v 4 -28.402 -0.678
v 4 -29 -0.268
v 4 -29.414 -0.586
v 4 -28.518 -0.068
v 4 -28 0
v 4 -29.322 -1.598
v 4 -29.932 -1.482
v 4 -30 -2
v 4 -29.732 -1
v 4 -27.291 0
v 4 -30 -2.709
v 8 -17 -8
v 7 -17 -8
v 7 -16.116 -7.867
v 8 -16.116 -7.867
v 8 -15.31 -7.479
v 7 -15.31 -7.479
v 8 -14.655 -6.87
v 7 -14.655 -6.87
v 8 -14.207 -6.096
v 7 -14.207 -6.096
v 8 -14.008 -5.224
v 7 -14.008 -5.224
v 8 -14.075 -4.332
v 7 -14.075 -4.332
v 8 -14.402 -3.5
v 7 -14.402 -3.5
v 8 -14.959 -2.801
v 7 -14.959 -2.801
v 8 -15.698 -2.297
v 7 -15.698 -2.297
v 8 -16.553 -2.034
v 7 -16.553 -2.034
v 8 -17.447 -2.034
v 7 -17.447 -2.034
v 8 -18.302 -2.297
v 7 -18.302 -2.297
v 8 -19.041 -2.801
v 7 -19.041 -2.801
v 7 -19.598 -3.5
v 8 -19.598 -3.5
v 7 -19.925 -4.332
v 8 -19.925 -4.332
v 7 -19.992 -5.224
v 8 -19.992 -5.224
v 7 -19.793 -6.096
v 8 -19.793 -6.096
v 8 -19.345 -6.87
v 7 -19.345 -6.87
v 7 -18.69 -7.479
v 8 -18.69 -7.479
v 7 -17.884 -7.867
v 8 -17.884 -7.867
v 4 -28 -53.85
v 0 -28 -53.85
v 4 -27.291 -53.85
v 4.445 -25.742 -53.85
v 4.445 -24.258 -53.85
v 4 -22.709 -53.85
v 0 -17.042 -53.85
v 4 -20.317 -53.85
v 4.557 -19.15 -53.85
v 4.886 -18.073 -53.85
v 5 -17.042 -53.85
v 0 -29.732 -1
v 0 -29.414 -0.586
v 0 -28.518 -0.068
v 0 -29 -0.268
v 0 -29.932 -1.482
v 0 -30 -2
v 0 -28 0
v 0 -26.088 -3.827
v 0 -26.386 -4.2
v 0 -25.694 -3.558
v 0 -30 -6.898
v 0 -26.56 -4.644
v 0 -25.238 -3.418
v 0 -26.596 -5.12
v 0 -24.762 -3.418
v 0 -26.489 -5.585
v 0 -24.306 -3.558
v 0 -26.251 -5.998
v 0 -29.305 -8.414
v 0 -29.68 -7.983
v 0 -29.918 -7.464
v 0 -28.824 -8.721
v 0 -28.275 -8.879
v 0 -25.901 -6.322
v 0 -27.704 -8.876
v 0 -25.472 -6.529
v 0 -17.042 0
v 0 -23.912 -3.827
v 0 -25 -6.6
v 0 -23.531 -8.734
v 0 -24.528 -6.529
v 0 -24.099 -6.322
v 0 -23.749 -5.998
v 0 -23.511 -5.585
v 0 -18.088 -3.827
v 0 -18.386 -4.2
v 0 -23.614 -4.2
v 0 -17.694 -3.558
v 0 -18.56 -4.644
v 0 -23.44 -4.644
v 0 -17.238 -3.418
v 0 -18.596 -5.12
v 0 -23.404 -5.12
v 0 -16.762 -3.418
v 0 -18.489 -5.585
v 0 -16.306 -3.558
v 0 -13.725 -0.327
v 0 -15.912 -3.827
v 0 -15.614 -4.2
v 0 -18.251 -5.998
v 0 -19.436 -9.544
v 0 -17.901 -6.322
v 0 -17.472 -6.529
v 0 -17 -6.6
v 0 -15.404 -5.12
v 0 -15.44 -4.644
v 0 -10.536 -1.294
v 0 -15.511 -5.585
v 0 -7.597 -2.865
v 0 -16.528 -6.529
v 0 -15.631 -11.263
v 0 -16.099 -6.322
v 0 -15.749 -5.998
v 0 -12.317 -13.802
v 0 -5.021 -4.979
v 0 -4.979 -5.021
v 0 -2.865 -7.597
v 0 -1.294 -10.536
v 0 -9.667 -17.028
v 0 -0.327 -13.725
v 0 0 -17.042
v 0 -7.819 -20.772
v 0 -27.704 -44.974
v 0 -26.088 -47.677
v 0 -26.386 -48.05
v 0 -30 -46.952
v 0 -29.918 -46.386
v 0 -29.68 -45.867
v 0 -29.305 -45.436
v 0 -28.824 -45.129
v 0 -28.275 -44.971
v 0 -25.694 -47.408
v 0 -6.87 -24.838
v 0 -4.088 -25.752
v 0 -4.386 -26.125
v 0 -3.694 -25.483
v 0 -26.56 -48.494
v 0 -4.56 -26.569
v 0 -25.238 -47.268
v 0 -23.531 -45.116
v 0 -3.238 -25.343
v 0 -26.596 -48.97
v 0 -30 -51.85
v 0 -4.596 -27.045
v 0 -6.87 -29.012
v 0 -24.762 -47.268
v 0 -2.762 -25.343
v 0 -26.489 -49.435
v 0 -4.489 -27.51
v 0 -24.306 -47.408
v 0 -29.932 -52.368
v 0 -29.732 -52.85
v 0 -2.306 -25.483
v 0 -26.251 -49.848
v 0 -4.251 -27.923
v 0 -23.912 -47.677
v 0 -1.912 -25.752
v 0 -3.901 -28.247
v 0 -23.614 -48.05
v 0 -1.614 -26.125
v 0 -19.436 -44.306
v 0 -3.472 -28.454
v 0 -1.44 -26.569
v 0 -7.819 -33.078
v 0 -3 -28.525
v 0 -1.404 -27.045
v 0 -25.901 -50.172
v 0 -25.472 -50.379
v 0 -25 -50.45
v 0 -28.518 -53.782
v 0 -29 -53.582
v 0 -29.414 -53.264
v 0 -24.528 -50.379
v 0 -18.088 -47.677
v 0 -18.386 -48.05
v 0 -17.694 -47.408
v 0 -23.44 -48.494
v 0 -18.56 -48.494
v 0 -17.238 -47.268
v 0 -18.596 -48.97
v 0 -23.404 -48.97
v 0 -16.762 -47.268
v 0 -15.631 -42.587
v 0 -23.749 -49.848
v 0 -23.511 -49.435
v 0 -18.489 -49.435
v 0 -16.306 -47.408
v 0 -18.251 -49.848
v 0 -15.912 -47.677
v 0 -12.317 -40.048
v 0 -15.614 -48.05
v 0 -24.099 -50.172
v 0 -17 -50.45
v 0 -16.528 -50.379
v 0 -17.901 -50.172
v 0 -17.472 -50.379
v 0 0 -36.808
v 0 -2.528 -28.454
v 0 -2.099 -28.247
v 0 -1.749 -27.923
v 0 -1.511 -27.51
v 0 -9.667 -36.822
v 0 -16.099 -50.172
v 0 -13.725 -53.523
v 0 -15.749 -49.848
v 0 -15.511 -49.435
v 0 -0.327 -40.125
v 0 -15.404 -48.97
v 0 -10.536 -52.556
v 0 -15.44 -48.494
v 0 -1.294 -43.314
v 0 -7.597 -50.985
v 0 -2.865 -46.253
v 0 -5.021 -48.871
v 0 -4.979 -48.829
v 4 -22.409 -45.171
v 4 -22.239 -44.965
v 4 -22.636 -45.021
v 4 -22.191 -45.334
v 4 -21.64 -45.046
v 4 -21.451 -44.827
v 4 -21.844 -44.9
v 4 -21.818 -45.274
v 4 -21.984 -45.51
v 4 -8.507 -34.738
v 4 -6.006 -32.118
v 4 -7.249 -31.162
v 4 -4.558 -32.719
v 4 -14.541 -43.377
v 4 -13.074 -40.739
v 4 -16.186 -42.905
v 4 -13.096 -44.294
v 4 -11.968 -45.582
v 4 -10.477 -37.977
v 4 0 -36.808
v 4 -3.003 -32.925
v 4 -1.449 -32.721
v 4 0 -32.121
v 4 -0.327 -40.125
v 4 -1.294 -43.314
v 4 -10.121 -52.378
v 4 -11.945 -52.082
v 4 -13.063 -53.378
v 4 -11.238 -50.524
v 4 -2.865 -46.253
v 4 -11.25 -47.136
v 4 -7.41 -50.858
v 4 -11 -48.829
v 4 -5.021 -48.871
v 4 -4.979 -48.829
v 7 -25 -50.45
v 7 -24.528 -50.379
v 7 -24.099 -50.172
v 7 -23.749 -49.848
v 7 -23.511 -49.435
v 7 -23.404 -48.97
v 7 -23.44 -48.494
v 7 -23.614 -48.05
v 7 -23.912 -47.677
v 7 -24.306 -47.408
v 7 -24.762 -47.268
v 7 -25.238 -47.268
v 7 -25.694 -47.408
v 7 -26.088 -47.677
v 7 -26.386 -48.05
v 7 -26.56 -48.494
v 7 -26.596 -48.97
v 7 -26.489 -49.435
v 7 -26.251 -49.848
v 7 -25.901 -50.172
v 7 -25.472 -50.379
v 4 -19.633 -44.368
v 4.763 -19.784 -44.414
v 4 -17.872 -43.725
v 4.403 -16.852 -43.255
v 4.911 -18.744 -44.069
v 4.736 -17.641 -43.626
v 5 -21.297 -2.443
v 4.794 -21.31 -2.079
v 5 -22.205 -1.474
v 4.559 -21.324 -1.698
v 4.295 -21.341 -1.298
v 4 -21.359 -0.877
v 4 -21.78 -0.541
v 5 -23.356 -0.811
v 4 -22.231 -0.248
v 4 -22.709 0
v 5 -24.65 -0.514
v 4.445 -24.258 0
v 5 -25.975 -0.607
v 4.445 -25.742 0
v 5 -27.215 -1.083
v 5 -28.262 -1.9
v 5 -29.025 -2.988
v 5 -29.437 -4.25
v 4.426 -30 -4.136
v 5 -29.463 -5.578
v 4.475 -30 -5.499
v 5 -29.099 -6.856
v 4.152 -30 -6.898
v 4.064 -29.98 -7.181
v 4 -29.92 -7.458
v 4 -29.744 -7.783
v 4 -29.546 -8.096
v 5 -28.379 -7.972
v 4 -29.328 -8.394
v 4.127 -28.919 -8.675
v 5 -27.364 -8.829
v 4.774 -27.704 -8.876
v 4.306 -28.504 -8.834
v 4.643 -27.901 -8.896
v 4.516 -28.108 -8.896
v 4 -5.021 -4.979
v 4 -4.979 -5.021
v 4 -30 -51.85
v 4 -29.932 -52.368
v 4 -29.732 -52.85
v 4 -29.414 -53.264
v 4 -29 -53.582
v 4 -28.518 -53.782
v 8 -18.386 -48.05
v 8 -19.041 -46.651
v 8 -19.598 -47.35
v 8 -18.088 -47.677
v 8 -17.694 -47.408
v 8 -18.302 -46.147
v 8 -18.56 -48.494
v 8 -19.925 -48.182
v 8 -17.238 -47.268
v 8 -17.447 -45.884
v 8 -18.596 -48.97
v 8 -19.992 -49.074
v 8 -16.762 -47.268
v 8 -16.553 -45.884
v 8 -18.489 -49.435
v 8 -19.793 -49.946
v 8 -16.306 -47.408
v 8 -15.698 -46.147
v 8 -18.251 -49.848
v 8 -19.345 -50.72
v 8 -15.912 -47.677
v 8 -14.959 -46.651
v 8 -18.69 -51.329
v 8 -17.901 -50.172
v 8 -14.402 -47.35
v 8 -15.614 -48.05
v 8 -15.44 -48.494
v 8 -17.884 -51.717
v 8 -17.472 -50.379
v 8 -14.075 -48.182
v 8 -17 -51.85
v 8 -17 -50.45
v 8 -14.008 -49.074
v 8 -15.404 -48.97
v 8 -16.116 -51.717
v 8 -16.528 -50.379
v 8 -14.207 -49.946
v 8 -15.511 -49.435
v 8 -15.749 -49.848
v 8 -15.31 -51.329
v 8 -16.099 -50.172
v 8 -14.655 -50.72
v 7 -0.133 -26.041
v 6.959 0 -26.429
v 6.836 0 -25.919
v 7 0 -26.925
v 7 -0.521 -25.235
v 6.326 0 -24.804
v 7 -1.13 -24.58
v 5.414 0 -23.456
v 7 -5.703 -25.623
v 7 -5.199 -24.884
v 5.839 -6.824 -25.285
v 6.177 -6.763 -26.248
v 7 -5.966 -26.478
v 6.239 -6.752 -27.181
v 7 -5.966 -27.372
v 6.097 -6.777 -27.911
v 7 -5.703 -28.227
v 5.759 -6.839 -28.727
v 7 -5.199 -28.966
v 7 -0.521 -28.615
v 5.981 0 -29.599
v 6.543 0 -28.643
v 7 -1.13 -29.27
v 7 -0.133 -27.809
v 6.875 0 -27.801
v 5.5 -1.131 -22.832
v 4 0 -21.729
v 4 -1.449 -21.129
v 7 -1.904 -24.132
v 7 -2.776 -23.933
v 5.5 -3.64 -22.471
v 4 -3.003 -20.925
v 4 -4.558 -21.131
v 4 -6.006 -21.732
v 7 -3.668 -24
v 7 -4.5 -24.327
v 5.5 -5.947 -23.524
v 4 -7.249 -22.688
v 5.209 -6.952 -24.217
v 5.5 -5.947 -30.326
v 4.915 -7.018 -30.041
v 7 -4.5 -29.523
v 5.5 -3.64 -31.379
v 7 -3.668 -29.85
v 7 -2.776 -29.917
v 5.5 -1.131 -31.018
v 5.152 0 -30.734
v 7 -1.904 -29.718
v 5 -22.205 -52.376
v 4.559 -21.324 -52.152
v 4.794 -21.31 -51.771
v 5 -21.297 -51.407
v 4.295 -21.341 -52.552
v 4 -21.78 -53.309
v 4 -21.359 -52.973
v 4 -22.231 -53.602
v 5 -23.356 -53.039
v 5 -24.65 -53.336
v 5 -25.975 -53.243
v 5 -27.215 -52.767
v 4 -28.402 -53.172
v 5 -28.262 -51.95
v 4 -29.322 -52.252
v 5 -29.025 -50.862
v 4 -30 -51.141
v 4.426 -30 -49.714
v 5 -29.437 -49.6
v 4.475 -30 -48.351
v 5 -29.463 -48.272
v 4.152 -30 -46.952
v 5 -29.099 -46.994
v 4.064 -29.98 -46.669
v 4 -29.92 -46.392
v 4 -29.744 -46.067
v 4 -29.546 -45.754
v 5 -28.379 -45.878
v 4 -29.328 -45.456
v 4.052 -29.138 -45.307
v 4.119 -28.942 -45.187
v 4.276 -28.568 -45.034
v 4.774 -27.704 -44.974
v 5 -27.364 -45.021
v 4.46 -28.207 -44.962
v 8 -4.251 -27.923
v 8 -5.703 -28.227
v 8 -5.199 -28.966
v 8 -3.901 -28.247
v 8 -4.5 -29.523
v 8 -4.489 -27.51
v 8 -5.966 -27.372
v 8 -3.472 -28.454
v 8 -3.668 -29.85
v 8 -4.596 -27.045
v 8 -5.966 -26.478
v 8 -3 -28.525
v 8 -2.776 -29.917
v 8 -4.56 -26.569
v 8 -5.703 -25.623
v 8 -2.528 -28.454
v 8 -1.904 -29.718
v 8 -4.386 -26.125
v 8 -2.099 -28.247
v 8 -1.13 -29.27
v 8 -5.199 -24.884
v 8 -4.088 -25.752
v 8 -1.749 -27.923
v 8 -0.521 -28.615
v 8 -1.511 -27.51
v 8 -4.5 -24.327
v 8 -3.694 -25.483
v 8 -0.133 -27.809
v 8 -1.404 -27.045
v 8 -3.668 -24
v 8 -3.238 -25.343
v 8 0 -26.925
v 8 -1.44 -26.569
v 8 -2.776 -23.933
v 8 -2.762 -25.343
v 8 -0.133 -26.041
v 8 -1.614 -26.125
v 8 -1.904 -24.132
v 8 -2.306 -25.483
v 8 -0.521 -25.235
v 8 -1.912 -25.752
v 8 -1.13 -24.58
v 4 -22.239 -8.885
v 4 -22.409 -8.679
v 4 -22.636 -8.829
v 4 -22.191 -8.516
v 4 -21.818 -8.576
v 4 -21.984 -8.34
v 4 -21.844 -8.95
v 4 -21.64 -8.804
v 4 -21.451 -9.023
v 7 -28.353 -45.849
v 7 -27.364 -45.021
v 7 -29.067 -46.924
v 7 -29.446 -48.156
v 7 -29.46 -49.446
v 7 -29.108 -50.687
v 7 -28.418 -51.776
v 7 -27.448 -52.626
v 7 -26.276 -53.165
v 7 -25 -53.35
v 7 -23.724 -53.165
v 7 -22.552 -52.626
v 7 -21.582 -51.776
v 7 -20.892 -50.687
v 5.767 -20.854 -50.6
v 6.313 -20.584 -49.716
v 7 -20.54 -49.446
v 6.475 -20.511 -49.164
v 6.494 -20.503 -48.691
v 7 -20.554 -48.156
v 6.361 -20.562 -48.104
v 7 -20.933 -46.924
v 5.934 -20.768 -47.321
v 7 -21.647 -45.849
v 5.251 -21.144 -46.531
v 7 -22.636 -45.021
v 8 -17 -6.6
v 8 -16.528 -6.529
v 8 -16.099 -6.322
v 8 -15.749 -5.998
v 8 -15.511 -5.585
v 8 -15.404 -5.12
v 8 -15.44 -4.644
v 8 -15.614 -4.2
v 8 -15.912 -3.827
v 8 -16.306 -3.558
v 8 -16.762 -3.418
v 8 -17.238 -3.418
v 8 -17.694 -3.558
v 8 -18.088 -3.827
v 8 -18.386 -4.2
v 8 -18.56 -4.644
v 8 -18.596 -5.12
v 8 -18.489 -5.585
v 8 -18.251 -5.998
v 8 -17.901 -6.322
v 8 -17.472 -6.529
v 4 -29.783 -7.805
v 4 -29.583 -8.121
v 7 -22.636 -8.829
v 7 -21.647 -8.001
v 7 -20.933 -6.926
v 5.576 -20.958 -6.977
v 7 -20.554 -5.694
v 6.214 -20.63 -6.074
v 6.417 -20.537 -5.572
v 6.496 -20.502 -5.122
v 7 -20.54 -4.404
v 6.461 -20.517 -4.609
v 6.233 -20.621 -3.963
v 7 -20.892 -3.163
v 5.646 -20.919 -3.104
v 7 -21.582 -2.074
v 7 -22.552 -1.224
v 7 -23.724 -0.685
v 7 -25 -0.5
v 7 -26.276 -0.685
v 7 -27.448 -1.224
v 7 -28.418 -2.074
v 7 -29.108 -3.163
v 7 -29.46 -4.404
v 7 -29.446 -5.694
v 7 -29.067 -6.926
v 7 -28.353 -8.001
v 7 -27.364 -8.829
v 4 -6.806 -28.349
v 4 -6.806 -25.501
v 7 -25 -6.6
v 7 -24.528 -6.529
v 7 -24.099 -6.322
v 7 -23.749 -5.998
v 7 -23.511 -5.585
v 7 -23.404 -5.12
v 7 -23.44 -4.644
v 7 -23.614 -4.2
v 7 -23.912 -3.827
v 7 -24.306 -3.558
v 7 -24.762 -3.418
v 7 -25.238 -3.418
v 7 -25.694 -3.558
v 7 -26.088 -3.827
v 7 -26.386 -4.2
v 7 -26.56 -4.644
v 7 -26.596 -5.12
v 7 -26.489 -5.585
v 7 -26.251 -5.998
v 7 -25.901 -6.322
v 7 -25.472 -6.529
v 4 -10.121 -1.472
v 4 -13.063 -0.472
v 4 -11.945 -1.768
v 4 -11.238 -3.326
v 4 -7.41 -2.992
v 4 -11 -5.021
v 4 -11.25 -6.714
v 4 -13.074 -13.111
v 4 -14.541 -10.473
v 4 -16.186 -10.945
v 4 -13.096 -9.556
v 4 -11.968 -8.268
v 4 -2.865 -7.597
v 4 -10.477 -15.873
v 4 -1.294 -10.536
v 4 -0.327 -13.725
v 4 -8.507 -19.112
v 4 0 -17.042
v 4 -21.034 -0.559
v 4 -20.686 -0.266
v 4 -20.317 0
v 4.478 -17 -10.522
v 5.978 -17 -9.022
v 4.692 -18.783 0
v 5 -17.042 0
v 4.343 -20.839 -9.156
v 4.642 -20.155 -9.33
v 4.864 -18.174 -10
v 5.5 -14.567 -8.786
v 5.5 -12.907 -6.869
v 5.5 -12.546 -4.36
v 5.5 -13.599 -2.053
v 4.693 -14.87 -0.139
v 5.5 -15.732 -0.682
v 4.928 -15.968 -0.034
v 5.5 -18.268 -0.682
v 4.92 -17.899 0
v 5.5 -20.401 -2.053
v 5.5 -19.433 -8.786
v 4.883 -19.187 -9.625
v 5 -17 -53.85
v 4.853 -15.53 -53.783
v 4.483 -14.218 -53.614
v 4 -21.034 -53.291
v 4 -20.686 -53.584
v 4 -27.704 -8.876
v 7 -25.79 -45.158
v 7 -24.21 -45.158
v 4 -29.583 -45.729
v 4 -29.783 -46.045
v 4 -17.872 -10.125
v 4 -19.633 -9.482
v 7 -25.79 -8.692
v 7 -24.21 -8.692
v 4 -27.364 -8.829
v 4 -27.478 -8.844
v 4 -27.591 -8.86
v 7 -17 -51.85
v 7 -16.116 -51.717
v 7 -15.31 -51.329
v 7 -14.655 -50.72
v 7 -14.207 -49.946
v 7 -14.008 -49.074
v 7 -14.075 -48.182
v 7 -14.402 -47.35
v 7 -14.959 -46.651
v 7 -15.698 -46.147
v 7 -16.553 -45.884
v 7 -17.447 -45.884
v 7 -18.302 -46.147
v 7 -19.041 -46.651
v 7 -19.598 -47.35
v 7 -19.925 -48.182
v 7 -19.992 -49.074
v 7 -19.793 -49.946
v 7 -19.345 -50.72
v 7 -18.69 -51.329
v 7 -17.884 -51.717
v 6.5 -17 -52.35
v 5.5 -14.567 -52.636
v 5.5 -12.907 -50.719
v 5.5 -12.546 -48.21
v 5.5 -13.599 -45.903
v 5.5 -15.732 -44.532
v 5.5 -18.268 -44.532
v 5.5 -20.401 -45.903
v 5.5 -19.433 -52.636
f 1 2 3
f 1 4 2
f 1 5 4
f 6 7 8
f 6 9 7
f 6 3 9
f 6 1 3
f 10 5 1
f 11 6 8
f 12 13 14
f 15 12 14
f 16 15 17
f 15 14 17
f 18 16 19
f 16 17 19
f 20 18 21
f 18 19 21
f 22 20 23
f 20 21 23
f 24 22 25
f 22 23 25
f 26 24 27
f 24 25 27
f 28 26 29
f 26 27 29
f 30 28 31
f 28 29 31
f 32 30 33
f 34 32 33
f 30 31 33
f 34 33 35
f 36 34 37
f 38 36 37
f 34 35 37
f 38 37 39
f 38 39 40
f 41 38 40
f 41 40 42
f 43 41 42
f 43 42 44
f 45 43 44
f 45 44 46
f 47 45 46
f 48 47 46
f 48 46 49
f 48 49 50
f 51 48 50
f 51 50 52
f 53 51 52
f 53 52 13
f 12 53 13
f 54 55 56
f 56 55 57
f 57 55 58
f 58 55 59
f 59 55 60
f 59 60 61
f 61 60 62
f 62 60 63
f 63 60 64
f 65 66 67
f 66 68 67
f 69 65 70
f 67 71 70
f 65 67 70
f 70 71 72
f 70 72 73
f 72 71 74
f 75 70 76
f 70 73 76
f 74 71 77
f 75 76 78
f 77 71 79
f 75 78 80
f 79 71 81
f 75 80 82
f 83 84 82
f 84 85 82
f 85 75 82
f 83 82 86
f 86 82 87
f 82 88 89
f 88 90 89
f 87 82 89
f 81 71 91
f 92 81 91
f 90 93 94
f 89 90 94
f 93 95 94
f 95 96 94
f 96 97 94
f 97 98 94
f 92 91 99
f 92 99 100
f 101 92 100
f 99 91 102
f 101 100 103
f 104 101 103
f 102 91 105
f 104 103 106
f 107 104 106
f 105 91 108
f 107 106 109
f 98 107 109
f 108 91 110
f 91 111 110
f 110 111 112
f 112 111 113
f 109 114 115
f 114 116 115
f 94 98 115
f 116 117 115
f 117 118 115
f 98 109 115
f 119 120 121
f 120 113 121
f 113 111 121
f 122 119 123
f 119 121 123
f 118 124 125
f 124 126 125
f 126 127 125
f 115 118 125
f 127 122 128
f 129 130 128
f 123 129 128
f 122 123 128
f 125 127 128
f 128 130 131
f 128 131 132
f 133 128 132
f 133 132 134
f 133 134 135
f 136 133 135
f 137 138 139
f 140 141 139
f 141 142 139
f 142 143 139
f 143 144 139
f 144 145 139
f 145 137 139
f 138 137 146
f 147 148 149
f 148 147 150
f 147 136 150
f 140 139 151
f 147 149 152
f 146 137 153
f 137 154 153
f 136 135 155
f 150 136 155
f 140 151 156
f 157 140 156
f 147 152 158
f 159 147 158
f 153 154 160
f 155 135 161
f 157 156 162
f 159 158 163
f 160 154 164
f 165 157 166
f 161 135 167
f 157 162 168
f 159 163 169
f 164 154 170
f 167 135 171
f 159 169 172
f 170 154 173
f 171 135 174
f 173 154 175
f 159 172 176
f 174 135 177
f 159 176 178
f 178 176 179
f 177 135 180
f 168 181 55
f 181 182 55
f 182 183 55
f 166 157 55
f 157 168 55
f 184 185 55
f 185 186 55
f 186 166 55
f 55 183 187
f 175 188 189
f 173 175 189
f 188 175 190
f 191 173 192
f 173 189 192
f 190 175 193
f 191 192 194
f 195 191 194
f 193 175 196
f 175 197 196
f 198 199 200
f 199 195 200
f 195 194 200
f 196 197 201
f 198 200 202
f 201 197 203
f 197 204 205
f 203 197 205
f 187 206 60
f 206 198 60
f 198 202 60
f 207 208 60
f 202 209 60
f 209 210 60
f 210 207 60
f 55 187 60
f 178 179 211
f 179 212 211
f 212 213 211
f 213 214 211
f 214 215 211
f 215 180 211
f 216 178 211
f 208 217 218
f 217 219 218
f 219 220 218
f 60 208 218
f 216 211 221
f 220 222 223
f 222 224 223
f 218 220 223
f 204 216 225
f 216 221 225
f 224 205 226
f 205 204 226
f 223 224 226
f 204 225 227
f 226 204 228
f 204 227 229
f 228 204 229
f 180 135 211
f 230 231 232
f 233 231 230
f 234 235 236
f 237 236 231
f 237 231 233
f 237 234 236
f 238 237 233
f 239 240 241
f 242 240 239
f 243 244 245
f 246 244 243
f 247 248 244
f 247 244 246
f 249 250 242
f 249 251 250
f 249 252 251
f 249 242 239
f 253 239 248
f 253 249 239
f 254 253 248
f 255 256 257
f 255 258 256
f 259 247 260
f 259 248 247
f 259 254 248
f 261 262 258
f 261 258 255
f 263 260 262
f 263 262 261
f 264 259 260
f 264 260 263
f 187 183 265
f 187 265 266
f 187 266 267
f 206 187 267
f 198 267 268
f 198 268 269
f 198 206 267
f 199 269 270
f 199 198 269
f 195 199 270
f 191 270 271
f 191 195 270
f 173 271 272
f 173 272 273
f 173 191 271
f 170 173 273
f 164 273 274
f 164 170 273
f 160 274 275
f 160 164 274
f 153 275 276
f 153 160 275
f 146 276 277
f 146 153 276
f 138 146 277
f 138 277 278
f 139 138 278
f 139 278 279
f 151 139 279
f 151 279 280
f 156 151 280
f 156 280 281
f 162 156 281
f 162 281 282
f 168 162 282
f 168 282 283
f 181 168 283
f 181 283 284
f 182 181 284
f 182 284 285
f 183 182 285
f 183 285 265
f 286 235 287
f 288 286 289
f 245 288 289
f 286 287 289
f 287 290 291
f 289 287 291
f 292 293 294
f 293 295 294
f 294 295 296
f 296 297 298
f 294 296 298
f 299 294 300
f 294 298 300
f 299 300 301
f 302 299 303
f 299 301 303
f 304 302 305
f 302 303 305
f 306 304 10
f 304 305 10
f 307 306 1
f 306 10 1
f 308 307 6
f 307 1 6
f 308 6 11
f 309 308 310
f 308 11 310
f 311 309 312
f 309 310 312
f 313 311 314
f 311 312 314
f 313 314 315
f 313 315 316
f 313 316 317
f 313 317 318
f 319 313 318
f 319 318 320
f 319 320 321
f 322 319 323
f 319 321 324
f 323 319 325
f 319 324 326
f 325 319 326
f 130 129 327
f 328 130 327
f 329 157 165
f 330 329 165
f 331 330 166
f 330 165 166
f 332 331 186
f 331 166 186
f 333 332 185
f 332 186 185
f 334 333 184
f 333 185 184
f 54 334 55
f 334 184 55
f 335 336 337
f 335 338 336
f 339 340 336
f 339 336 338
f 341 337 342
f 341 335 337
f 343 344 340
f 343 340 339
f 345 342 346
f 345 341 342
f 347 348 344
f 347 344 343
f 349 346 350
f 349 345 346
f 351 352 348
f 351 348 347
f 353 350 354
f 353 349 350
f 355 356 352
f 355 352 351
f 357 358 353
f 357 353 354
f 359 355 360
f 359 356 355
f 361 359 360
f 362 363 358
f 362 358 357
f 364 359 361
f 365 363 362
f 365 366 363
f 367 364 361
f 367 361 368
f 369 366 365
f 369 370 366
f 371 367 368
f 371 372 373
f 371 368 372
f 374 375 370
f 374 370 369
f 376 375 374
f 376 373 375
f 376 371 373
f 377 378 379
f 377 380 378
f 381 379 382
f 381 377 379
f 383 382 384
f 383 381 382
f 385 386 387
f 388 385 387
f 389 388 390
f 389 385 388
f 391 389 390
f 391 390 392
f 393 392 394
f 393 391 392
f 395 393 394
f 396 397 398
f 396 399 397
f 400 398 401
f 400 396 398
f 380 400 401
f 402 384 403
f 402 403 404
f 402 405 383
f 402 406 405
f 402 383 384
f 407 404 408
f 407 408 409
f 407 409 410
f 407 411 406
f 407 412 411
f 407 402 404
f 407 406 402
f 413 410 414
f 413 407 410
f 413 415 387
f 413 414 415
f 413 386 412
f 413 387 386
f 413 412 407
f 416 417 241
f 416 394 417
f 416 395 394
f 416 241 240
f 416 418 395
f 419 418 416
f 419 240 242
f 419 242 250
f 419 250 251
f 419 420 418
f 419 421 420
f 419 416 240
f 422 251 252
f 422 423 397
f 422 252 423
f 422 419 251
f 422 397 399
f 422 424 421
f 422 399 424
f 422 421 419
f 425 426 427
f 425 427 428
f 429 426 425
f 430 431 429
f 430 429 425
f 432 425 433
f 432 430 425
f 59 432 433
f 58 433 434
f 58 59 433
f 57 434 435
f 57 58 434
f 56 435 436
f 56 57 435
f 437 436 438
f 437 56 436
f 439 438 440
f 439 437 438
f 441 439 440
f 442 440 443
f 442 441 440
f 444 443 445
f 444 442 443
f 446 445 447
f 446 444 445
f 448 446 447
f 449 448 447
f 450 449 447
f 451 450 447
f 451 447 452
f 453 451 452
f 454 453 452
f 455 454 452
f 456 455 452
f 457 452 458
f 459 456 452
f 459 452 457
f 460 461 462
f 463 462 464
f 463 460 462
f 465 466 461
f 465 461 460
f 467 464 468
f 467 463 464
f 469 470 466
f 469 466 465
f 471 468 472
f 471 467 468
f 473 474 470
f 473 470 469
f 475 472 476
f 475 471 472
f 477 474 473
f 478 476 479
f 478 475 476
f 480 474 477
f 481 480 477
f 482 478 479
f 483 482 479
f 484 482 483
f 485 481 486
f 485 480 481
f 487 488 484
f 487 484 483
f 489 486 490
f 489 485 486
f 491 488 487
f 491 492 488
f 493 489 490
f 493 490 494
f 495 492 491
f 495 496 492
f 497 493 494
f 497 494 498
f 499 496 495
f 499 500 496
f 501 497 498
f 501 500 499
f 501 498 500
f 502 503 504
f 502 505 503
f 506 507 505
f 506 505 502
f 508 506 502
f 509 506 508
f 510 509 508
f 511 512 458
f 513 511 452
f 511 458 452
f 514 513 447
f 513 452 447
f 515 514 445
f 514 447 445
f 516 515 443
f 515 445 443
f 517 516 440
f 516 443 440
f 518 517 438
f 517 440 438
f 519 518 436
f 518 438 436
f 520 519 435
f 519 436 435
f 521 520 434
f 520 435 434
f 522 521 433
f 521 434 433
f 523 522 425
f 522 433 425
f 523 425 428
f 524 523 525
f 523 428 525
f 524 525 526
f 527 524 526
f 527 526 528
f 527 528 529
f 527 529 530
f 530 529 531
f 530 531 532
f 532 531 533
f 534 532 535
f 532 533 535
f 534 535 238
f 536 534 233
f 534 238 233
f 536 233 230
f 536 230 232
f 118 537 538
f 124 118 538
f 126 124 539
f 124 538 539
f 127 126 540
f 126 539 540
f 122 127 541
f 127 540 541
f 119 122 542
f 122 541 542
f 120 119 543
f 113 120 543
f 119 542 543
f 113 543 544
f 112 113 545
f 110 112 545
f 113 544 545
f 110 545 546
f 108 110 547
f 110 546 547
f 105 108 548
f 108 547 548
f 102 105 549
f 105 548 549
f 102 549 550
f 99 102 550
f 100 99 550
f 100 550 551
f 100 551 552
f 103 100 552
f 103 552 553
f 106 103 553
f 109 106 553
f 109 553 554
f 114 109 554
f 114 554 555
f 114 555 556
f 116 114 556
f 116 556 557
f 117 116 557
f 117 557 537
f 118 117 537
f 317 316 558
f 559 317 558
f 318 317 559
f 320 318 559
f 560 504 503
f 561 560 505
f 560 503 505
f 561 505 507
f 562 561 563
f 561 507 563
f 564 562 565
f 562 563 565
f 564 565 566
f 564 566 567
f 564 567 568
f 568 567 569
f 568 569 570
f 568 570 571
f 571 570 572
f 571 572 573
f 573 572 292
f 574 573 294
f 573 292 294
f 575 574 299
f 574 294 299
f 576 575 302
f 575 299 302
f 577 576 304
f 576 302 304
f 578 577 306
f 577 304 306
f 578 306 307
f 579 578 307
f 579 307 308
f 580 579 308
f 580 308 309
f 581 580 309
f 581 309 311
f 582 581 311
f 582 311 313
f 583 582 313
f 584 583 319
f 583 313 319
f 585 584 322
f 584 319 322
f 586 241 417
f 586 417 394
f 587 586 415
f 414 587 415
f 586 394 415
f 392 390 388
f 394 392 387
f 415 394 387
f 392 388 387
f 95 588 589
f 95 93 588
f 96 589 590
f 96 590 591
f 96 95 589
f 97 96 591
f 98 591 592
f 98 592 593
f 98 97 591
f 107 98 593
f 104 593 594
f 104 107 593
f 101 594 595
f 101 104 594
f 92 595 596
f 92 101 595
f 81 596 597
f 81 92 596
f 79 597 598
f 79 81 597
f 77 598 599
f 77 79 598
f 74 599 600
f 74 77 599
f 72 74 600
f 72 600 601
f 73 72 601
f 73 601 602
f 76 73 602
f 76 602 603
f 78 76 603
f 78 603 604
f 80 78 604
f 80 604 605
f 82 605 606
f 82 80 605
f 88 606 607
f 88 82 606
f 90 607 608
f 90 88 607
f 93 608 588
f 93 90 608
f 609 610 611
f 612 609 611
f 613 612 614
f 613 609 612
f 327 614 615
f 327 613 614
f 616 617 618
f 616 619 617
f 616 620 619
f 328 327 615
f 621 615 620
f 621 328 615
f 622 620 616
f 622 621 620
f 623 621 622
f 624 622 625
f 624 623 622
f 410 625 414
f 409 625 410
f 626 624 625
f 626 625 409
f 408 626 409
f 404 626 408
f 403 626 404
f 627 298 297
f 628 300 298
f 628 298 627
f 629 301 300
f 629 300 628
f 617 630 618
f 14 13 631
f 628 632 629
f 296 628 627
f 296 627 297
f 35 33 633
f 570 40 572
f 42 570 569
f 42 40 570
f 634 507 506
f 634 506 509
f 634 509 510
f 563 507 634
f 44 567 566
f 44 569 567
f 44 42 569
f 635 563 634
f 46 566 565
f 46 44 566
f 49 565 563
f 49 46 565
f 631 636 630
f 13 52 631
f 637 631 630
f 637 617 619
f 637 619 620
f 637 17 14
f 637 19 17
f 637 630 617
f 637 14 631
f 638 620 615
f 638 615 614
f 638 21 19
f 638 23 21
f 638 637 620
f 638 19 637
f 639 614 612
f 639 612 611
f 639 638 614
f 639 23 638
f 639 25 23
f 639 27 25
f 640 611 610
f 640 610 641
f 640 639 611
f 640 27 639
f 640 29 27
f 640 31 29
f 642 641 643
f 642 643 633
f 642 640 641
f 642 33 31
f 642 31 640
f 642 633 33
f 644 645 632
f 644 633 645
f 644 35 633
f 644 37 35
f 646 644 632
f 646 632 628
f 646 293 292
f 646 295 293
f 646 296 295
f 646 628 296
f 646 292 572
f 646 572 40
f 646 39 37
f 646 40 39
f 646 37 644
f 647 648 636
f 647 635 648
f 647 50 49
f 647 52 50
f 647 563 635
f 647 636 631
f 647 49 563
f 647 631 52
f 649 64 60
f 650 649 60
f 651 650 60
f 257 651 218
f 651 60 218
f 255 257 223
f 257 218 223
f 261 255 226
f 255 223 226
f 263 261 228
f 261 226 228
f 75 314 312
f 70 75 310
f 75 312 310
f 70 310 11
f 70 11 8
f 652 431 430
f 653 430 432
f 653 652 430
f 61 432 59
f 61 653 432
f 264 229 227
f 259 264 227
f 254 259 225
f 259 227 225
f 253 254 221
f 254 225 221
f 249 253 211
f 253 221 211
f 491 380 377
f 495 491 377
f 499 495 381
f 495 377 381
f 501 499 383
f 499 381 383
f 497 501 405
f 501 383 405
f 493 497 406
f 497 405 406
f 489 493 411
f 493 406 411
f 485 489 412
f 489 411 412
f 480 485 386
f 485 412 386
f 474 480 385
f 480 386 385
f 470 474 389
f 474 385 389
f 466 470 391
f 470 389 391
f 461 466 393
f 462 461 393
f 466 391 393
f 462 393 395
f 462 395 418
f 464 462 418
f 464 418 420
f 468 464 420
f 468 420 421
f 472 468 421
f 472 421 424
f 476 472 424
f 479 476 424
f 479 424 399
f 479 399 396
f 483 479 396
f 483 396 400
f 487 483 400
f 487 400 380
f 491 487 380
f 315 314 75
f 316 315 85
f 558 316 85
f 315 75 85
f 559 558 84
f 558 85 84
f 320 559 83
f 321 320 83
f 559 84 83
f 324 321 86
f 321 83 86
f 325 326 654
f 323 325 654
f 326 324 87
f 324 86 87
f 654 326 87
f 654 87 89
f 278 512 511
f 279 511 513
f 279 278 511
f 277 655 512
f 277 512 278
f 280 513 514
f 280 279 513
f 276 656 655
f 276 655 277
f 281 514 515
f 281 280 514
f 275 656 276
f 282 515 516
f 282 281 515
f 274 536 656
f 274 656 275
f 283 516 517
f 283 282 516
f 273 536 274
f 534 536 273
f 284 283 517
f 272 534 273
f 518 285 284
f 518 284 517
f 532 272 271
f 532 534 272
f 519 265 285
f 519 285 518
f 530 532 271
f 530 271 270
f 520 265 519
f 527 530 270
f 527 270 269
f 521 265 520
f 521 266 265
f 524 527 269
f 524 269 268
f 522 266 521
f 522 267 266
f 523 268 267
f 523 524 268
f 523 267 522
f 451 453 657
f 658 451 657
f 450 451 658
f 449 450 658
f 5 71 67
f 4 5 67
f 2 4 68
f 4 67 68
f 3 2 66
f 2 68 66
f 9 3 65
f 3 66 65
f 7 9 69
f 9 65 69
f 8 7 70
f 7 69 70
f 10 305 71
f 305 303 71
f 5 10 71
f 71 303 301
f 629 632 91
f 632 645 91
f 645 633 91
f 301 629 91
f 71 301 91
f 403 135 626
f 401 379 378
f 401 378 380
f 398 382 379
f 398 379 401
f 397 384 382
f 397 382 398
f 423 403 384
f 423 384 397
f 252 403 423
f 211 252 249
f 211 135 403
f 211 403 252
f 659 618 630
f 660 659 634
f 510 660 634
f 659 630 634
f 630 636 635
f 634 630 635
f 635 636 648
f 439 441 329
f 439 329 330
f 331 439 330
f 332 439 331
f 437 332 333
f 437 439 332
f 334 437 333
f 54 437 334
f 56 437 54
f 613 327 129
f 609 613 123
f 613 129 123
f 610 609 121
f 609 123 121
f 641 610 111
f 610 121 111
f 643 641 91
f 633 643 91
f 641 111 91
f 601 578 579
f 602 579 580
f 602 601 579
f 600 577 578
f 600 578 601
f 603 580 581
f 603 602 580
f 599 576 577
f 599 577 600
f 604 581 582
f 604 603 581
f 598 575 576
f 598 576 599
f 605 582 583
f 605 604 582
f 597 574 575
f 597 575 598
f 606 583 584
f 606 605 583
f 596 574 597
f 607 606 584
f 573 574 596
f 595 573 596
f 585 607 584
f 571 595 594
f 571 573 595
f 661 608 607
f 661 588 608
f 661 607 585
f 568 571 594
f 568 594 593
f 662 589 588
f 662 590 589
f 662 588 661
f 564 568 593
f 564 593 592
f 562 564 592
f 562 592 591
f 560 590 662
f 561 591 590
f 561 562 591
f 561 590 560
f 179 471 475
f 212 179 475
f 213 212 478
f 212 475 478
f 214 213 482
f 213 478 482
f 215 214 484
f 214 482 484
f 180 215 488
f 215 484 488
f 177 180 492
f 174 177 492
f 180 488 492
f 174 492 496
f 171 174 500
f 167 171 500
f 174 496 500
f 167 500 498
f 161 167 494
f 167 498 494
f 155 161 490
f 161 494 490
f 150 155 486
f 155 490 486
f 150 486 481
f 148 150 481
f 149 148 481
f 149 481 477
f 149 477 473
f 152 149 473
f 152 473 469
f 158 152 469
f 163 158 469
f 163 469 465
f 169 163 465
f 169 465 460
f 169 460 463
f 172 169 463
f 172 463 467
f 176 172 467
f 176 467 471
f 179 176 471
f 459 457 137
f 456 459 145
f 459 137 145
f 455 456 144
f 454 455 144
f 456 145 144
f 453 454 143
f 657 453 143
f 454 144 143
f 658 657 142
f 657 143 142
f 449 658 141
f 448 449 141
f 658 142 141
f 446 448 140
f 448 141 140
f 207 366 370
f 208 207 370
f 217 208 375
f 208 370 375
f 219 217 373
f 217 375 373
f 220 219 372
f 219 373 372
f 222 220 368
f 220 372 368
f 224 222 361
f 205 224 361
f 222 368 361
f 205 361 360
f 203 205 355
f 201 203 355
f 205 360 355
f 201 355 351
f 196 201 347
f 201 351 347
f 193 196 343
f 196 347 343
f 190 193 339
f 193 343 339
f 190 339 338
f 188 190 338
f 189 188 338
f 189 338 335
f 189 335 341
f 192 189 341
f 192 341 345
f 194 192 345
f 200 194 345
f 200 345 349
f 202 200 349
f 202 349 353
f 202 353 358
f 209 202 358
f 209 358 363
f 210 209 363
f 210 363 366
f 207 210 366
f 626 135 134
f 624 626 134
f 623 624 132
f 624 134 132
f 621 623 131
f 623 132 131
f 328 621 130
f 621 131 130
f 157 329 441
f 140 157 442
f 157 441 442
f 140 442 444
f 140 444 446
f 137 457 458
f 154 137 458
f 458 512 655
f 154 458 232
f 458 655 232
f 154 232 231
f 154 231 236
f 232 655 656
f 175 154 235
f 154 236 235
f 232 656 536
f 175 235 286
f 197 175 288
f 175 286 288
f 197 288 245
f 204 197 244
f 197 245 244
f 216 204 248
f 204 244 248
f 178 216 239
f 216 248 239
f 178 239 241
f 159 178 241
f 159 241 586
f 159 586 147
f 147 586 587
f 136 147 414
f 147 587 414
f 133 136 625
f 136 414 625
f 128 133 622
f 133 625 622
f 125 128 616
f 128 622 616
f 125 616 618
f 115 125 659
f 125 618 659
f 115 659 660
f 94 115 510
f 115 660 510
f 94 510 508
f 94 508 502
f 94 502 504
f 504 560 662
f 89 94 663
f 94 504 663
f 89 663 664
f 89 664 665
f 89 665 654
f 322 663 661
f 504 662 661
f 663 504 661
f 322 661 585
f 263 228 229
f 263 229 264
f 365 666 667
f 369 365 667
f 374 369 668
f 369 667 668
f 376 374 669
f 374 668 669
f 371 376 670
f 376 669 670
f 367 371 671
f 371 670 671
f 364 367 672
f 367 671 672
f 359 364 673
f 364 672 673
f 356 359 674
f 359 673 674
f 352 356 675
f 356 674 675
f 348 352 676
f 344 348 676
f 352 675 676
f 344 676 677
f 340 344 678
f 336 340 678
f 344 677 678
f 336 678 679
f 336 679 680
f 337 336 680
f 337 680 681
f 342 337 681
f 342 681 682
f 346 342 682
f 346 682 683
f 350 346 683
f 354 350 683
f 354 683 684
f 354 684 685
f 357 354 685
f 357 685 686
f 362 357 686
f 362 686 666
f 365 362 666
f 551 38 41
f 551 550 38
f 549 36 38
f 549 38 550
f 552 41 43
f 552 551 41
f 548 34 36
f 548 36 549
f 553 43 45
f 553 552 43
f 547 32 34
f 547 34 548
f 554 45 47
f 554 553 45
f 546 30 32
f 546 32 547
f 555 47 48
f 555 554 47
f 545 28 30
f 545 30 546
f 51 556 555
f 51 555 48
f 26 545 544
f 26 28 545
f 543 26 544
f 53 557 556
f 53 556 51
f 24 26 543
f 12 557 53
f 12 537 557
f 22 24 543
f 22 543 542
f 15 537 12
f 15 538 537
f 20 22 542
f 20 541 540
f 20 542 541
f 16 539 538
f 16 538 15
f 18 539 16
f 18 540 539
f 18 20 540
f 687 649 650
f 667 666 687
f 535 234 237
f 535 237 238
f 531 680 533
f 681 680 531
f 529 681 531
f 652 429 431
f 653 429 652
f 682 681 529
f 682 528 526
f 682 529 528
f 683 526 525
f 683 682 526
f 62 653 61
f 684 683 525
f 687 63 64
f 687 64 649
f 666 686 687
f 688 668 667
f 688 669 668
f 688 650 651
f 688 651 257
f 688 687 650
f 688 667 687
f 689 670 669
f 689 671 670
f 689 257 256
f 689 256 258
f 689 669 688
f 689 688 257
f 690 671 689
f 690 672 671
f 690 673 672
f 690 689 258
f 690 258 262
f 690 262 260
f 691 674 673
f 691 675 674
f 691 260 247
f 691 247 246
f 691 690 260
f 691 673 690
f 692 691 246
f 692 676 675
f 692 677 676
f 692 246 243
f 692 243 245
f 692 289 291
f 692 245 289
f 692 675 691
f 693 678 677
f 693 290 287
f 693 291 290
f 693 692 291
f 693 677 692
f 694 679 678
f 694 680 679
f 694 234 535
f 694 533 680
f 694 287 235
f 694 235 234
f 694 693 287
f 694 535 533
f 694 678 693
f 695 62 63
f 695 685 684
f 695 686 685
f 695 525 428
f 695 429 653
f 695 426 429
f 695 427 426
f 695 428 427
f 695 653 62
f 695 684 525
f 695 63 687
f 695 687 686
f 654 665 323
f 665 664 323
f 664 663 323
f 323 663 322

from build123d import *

# Parameters (mm, degrees)
SKETCH_1_W               = 53.85
SKETCH_1_H               = 30
SKETCH_1_R               = 1.6
EXTRUDE_1_DEPTH          = 4
SKETCH_7_R               = 4.5
SKETCH_7_R_2             = 1.6
EXTRUDE_3_DEPTH          = 3
CUT_EXTRUDE_1_DEPTH      = 62.772344136
CUT_EXTRUDE_1_DEPTH_BACK = 4
SKETCH_2_R               = 18.25
CHAMFER_1_SIZE           = 10
SKETCH_3_R               = 3
EXTRUDE_2_DEPTH          = 4
SKETCH_4_R               = 1.6
CUT_EXTRUDE_2_DEPTH      = 63.159653313
CHAMFER_3_SIZE           = 3
CHAMFER_4_SIZE           = 1
FILLET_1_R               = 2
FILLET_2_R               = 17


with BuildPart() as part:
    # 草图1 → 凸台-拉伸1 (new body)
    with BuildSketch(Plane(origin=(0, 0, 0), x_dir=(0, 0, -1), z_dir=(1, 0, 0))):
        with Locations((26.925, -15)):
            Rectangle(SKETCH_1_W, SKETCH_1_H)
        with Locations((5, -25)):
            Circle(SKETCH_1_R, mode=Mode.SUBTRACT)
        with Locations((48.85, -25)):
            Circle(SKETCH_1_R, mode=Mode.SUBTRACT)
    extrude(amount=EXTRUDE_1_DEPTH)

    # 草图7 → 凸台-拉伸3 (add)
    # profile 1 of 2: a face of its own
    with BuildSketch(Plane(origin=(4, 0, 0), x_dir=(0, 0, -1), z_dir=(1, 0, 0))):
        with Locations((5, -25)):
            Circle(SKETCH_7_R)
        with Locations((5, -25)):
            Circle(SKETCH_7_R_2, mode=Mode.SUBTRACT)
    # profile 2 of 2: a face of its own
    with BuildSketch(Plane(origin=(4, 0, 0), x_dir=(0, 0, -1), z_dir=(1, 0, 0))):
        with Locations((48.85, -25)):
            Circle(SKETCH_7_R)
        with Locations((48.85, -25)):
            Circle(SKETCH_7_R_2, mode=Mode.SUBTRACT)
    extrude(amount=EXTRUDE_3_DEPTH)

    # 草图2 → 切除-拉伸1 (cut, two sides: drawn at the far end of the back side and taken through both)
    with BuildSketch(Plane(origin=(4, 0, 0), x_dir=(0, 0, -1), z_dir=(1, 0, 0)).offset(-CUT_EXTRUDE_1_DEPTH_BACK)):
        with Locations((26.925, -25)):
            Circle(SKETCH_2_R)
    extrude(amount=CUT_EXTRUDE_1_DEPTH + CUT_EXTRUDE_1_DEPTH_BACK, mode=Mode.SUBTRACT)

    # 倒角1
    chamfer_1_edges = [part.edges().sort_by_distance(p)[0] for p in [
        (2, 0, 0),
        (2, 0, -53.85),
    ]]
    chamfer(chamfer_1_edges, length=CHAMFER_1_SIZE)

    # 草图3 → 凸台-拉伸2 (add)
    with BuildSketch(Plane(origin=(4, 0, 0), x_dir=(0, 0, -1), z_dir=(1, 0, 0))):
        with Locations((5, -17)):
            Circle(SKETCH_3_R)
        with Locations((48.85, -17)):
            Circle(SKETCH_3_R)
        with Locations(Location((26.925, -3, 0), (0, 0, 90))):
            Circle(SKETCH_3_R)
    extrude(amount=EXTRUDE_2_DEPTH)

    # 草图4 → 切除-拉伸2 (cut, through all)
    with BuildSketch(Plane(origin=(8, 0, 0), x_dir=(0, 0, -1), z_dir=(1, 0, 0))):
        with Locations((5, -17)):
            Circle(SKETCH_4_R)
        with Locations((48.85, -17)):
            Circle(SKETCH_4_R)
        with Locations((26.925, -3)):
            Circle(SKETCH_4_R)
    extrude(amount=-CUT_EXTRUDE_2_DEPTH, mode=Mode.SUBTRACT)

    # 倒角3
    # the kernel refuses this chamfer: 3 mm, written as the material it adds along each edge
    with BuildSketch(Plane(origin=(4, -17, -5), x_dir=(0, 0, -1), z_dir=(0, -1, 0))) as chamfer_3_piece_1_section:
        Polygon((3 + CHAMFER_3_SIZE, 0), (3, CHAMFER_3_SIZE), (3, 0), align=None)
    chamfer_3_piece_1 = revolve(axis=Axis((4, -17, -5), (1, 0, 0)), mode=Mode.PRIVATE)
    chamfer_3_piece_1 = split(chamfer_3_piece_1, bisect_by=Plane(origin=(5.467307701, -17, 0), z_dir=(0, 0, -1)), keep=Keep.TOP, mode=Mode.PRIVATE)
    chamfer_3_piece_1 = chamfer_3_piece_1 - Plane(origin=(5.467307701, -25, -26.925), x_dir=(0, 0, -1), z_dir=(1, 0, 0)) * Cylinder(18.25, 25, mode=Mode.PRIVATE)
    with BuildSketch(Plane(origin=(4, -17, -48.85), x_dir=(0, 0, -1), z_dir=(0, -1, 0))) as chamfer_3_piece_2_section:
        Polygon((3 + CHAMFER_3_SIZE, 0), (3, CHAMFER_3_SIZE), (3, 0), align=None)
    chamfer_3_piece_2 = revolve(axis=Axis((4, -17, -48.85), (1, 0, 0)), mode=Mode.PRIVATE)
    chamfer_3_piece_2 = chamfer_3_piece_2 - Plane(origin=(5.467307729, -25, -26.925), x_dir=(0, 0, -1), z_dir=(1, 0, 0)) * Cylinder(18.25, 24, mode=Mode.PRIVATE)
    chamfer_3_piece_2 = split(chamfer_3_piece_2, bisect_by=Plane(origin=(5.467307729, -17, -53.85), z_dir=(0, 0, 1)), keep=Keep.TOP, mode=Mode.PRIVATE)
    with BuildSketch(Plane(origin=(4, -3, -26.925), x_dir=(0, 1, 0), z_dir=(0, 0, -1))) as chamfer_3_piece_3_section:
        Polygon((3 + CHAMFER_3_SIZE, 0), (3, CHAMFER_3_SIZE), (3, 0), align=None)
    chamfer_3_piece_3 = revolve(axis=Axis((4, -3, -26.925), (1, 0, 0)), mode=Mode.PRIVATE)
    chamfer_3_piece_3 = split(chamfer_3_piece_3, bisect_by=Plane(origin=(4.469931391, 0, -22.187900458), z_dir=(0, -1, 0)), keep=Keep.TOP, mode=Mode.PRIVATE)
    chamfer_3_piece_3 = chamfer_3_piece_3 - Plane(origin=(4.469931391, -25, -26.925), x_dir=(0, 0, -1), z_dir=(1, 0, 0)) * Cylinder(18.25, 24, mode=Mode.PRIVATE)
    add([chamfer_3_piece_1, chamfer_3_piece_2, chamfer_3_piece_3])

    # 倒角4
    # the kernel refuses this chamfer: 1 mm, written as the material it adds along each edge
    with BuildSketch(Plane(origin=(4, -25, -48.85), x_dir=(0, 0.9653833924151701, -0.26083501614809607), z_dir=(0, 0.26083501614809607, 0.9653833924151701))) as chamfer_4_piece_1_section:
        Polygon((4.5, -CHAMFER_4_SIZE), (4.5 + CHAMFER_4_SIZE, 0), (4.5, 0), align=None)
    chamfer_4_piece_1 = revolve(axis=Axis((4, -25, -48.85), (-1, 0, 0)), revolution_arc=255.986755494, mode=Mode.PRIVATE)
    chamfer_4_piece_1 = chamfer_4_piece_1 - Plane(origin=(4.294296116, -25, -26.925), x_dir=(0, 0, -1), z_dir=(1, 0, 0)) * Cylinder(18.25, 22, mode=Mode.PRIVATE)
    chamfer_4_piece_1 = split(chamfer_4_piece_1, bisect_by=Plane(origin=(4.294296116, -30, -51.249638495), z_dir=(0, 1, 0)), keep=Keep.TOP, mode=Mode.PRIVATE)
    chamfer_4_piece_1 = split(chamfer_4_piece_1, bisect_by=Plane(origin=(4.294296116, -20.838072268, -53.85), z_dir=(0, 0, 1)), keep=Keep.TOP, mode=Mode.PRIVATE)
    add(chamfer_4_piece_1)
    with BuildSketch(Plane(origin=(4, -25, -5), x_dir=(0, 0.9653833924151692, 0.26083501614809945), z_dir=(0, 0.26083501614809945, -0.9653833924151692))) as chamfer_4_piece_2_section:
        Polygon((4.5, CHAMFER_4_SIZE), (4.5 + CHAMFER_4_SIZE, 0), (4.5, 0), align=None)
    chamfer_4_piece_2 = revolve(axis=Axis((4, -25, -5), (1, 0, 0)), revolution_arc=255.986755494, mode=Mode.PRIVATE)
    chamfer_4_piece_2 = chamfer_4_piece_2 - Plane(origin=(4.294296117, -25, -26.925), x_dir=(0, 0, -1), z_dir=(1, 0, 0)) * Cylinder(18.25, 22, mode=Mode.PRIVATE)
    chamfer_4_piece_2 = split(chamfer_4_piece_2, bisect_by=Plane(origin=(4.294296117, -30, -2.600361506), z_dir=(0, 1, 0)), keep=Keep.TOP, mode=Mode.PRIVATE)
    chamfer_4_piece_2 = split(chamfer_4_piece_2, bisect_by=Plane(origin=(4.294296117, -20.838072268, 0), z_dir=(0, 0, -1)), keep=Keep.TOP, mode=Mode.PRIVATE)
    add(chamfer_4_piece_2)

    # 圆角1
    # the kernel refuses this fillet: 2 mm, written as the material it takes off along each edge
    with BuildSketch(Plane(origin=(-6.187088914, -30, -9.373290682), x_dir=(0, 0, 1), z_dir=(1, 0, 0))) as fillet_1_piece_1:
        with BuildLine():
            CenterArc((2.474835566, -2), FILLET_1_R, 90, 98.519624254)
            ThreePointArc((0.496905207, -2.296296296), (0.285443162, -1.140143606), (0, 0))
            Line((0, 0), (2.474835566, 0))
        make_face()
    extrude(amount=16.374177829, mode=Mode.SUBTRACT)
    with BuildSketch(Plane(origin=(-6.187088914, -30, -44.476709318), x_dir=(0, 0.977378218113637, -0.21149898051057317), z_dir=(1, 0, 0))) as fillet_1_piece_2:
        with BuildLine():
            CenterArc((2.478181635, -1.995852414), FILLET_1_R, 93.690586551, 98.519624254)
            Line((0.523425199, -2.418850375), (0, 0))
            ThreePointArc((0, 0), (1.174722463, -0.037846719), (2.349444927, 0))
        make_face()
    extrude(amount=16.374177829, mode=Mode.SUBTRACT)
    with BuildSketch(Plane(origin=(-5, -30, -53.85), x_dir=(0, 0, 1), z_dir=(1, 0, 0)), Plane(origin=(-5, -30, 0), x_dir=(0, 1, 0), z_dir=(1, 0, 0))) as fillet_1_piece_3:
        with BuildLine():
            CenterArc((FILLET_1_R, -FILLET_1_R), FILLET_1_R, 90, 90)
            Line((0, -FILLET_1_R), (0, 0))
            Line((0, 0), (FILLET_1_R, 0))
        make_face()
    extrude(amount=14, mode=Mode.SUBTRACT)

    # 圆角2
    # the kernel refuses this fillet: 17 mm, written as the material it takes off along each edge
    with BuildSketch(Plane(origin=(-17.604076401, -10, -53.85), x_dir=(0, -1, 0), z_dir=(1, 0, 0))) as fillet_2_piece_1:
        with BuildLine():
            CenterArc((FILLET_2_R * 0.414213562373, -FILLET_2_R), FILLET_2_R, 90, 45)
            Line((-FILLET_2_R * 0.292893218813, -FILLET_2_R * 0.292893218813), (0, 0))
            Line((0, 0), (FILLET_2_R * 0.414213562373, 0))
        make_face()
    extrude(amount=39.208152802, mode=Mode.SUBTRACT)
    with BuildSketch(Plane(origin=(-17.604076401, 0, -43.85), x_dir=(0, 0, 1), z_dir=(1, 0, 0)), Plane(origin=(-17.604076401, -10, 0), x_dir=(0, -1, 0), z_dir=(1, 0, 0)), Plane(origin=(-17.604076401, 0, -10), x_dir=(0, -0.7071067811865477, 0.7071067811865474), z_dir=(1, 0, 0))) as fillet_2_piece_2:
        with BuildLine():
            CenterArc((FILLET_2_R * 0.414213562373, FILLET_2_R), FILLET_2_R, 225, 45)
            Line((-FILLET_2_R * 0.292893218813, FILLET_2_R * 0.292893218813), (0, 0))
            Line((0, 0), (FILLET_2_R * 0.414213562373, 0))
        make_face()
    extrude(amount=39.208152802, mode=Mode.SUBTRACT)


solid = part.part
